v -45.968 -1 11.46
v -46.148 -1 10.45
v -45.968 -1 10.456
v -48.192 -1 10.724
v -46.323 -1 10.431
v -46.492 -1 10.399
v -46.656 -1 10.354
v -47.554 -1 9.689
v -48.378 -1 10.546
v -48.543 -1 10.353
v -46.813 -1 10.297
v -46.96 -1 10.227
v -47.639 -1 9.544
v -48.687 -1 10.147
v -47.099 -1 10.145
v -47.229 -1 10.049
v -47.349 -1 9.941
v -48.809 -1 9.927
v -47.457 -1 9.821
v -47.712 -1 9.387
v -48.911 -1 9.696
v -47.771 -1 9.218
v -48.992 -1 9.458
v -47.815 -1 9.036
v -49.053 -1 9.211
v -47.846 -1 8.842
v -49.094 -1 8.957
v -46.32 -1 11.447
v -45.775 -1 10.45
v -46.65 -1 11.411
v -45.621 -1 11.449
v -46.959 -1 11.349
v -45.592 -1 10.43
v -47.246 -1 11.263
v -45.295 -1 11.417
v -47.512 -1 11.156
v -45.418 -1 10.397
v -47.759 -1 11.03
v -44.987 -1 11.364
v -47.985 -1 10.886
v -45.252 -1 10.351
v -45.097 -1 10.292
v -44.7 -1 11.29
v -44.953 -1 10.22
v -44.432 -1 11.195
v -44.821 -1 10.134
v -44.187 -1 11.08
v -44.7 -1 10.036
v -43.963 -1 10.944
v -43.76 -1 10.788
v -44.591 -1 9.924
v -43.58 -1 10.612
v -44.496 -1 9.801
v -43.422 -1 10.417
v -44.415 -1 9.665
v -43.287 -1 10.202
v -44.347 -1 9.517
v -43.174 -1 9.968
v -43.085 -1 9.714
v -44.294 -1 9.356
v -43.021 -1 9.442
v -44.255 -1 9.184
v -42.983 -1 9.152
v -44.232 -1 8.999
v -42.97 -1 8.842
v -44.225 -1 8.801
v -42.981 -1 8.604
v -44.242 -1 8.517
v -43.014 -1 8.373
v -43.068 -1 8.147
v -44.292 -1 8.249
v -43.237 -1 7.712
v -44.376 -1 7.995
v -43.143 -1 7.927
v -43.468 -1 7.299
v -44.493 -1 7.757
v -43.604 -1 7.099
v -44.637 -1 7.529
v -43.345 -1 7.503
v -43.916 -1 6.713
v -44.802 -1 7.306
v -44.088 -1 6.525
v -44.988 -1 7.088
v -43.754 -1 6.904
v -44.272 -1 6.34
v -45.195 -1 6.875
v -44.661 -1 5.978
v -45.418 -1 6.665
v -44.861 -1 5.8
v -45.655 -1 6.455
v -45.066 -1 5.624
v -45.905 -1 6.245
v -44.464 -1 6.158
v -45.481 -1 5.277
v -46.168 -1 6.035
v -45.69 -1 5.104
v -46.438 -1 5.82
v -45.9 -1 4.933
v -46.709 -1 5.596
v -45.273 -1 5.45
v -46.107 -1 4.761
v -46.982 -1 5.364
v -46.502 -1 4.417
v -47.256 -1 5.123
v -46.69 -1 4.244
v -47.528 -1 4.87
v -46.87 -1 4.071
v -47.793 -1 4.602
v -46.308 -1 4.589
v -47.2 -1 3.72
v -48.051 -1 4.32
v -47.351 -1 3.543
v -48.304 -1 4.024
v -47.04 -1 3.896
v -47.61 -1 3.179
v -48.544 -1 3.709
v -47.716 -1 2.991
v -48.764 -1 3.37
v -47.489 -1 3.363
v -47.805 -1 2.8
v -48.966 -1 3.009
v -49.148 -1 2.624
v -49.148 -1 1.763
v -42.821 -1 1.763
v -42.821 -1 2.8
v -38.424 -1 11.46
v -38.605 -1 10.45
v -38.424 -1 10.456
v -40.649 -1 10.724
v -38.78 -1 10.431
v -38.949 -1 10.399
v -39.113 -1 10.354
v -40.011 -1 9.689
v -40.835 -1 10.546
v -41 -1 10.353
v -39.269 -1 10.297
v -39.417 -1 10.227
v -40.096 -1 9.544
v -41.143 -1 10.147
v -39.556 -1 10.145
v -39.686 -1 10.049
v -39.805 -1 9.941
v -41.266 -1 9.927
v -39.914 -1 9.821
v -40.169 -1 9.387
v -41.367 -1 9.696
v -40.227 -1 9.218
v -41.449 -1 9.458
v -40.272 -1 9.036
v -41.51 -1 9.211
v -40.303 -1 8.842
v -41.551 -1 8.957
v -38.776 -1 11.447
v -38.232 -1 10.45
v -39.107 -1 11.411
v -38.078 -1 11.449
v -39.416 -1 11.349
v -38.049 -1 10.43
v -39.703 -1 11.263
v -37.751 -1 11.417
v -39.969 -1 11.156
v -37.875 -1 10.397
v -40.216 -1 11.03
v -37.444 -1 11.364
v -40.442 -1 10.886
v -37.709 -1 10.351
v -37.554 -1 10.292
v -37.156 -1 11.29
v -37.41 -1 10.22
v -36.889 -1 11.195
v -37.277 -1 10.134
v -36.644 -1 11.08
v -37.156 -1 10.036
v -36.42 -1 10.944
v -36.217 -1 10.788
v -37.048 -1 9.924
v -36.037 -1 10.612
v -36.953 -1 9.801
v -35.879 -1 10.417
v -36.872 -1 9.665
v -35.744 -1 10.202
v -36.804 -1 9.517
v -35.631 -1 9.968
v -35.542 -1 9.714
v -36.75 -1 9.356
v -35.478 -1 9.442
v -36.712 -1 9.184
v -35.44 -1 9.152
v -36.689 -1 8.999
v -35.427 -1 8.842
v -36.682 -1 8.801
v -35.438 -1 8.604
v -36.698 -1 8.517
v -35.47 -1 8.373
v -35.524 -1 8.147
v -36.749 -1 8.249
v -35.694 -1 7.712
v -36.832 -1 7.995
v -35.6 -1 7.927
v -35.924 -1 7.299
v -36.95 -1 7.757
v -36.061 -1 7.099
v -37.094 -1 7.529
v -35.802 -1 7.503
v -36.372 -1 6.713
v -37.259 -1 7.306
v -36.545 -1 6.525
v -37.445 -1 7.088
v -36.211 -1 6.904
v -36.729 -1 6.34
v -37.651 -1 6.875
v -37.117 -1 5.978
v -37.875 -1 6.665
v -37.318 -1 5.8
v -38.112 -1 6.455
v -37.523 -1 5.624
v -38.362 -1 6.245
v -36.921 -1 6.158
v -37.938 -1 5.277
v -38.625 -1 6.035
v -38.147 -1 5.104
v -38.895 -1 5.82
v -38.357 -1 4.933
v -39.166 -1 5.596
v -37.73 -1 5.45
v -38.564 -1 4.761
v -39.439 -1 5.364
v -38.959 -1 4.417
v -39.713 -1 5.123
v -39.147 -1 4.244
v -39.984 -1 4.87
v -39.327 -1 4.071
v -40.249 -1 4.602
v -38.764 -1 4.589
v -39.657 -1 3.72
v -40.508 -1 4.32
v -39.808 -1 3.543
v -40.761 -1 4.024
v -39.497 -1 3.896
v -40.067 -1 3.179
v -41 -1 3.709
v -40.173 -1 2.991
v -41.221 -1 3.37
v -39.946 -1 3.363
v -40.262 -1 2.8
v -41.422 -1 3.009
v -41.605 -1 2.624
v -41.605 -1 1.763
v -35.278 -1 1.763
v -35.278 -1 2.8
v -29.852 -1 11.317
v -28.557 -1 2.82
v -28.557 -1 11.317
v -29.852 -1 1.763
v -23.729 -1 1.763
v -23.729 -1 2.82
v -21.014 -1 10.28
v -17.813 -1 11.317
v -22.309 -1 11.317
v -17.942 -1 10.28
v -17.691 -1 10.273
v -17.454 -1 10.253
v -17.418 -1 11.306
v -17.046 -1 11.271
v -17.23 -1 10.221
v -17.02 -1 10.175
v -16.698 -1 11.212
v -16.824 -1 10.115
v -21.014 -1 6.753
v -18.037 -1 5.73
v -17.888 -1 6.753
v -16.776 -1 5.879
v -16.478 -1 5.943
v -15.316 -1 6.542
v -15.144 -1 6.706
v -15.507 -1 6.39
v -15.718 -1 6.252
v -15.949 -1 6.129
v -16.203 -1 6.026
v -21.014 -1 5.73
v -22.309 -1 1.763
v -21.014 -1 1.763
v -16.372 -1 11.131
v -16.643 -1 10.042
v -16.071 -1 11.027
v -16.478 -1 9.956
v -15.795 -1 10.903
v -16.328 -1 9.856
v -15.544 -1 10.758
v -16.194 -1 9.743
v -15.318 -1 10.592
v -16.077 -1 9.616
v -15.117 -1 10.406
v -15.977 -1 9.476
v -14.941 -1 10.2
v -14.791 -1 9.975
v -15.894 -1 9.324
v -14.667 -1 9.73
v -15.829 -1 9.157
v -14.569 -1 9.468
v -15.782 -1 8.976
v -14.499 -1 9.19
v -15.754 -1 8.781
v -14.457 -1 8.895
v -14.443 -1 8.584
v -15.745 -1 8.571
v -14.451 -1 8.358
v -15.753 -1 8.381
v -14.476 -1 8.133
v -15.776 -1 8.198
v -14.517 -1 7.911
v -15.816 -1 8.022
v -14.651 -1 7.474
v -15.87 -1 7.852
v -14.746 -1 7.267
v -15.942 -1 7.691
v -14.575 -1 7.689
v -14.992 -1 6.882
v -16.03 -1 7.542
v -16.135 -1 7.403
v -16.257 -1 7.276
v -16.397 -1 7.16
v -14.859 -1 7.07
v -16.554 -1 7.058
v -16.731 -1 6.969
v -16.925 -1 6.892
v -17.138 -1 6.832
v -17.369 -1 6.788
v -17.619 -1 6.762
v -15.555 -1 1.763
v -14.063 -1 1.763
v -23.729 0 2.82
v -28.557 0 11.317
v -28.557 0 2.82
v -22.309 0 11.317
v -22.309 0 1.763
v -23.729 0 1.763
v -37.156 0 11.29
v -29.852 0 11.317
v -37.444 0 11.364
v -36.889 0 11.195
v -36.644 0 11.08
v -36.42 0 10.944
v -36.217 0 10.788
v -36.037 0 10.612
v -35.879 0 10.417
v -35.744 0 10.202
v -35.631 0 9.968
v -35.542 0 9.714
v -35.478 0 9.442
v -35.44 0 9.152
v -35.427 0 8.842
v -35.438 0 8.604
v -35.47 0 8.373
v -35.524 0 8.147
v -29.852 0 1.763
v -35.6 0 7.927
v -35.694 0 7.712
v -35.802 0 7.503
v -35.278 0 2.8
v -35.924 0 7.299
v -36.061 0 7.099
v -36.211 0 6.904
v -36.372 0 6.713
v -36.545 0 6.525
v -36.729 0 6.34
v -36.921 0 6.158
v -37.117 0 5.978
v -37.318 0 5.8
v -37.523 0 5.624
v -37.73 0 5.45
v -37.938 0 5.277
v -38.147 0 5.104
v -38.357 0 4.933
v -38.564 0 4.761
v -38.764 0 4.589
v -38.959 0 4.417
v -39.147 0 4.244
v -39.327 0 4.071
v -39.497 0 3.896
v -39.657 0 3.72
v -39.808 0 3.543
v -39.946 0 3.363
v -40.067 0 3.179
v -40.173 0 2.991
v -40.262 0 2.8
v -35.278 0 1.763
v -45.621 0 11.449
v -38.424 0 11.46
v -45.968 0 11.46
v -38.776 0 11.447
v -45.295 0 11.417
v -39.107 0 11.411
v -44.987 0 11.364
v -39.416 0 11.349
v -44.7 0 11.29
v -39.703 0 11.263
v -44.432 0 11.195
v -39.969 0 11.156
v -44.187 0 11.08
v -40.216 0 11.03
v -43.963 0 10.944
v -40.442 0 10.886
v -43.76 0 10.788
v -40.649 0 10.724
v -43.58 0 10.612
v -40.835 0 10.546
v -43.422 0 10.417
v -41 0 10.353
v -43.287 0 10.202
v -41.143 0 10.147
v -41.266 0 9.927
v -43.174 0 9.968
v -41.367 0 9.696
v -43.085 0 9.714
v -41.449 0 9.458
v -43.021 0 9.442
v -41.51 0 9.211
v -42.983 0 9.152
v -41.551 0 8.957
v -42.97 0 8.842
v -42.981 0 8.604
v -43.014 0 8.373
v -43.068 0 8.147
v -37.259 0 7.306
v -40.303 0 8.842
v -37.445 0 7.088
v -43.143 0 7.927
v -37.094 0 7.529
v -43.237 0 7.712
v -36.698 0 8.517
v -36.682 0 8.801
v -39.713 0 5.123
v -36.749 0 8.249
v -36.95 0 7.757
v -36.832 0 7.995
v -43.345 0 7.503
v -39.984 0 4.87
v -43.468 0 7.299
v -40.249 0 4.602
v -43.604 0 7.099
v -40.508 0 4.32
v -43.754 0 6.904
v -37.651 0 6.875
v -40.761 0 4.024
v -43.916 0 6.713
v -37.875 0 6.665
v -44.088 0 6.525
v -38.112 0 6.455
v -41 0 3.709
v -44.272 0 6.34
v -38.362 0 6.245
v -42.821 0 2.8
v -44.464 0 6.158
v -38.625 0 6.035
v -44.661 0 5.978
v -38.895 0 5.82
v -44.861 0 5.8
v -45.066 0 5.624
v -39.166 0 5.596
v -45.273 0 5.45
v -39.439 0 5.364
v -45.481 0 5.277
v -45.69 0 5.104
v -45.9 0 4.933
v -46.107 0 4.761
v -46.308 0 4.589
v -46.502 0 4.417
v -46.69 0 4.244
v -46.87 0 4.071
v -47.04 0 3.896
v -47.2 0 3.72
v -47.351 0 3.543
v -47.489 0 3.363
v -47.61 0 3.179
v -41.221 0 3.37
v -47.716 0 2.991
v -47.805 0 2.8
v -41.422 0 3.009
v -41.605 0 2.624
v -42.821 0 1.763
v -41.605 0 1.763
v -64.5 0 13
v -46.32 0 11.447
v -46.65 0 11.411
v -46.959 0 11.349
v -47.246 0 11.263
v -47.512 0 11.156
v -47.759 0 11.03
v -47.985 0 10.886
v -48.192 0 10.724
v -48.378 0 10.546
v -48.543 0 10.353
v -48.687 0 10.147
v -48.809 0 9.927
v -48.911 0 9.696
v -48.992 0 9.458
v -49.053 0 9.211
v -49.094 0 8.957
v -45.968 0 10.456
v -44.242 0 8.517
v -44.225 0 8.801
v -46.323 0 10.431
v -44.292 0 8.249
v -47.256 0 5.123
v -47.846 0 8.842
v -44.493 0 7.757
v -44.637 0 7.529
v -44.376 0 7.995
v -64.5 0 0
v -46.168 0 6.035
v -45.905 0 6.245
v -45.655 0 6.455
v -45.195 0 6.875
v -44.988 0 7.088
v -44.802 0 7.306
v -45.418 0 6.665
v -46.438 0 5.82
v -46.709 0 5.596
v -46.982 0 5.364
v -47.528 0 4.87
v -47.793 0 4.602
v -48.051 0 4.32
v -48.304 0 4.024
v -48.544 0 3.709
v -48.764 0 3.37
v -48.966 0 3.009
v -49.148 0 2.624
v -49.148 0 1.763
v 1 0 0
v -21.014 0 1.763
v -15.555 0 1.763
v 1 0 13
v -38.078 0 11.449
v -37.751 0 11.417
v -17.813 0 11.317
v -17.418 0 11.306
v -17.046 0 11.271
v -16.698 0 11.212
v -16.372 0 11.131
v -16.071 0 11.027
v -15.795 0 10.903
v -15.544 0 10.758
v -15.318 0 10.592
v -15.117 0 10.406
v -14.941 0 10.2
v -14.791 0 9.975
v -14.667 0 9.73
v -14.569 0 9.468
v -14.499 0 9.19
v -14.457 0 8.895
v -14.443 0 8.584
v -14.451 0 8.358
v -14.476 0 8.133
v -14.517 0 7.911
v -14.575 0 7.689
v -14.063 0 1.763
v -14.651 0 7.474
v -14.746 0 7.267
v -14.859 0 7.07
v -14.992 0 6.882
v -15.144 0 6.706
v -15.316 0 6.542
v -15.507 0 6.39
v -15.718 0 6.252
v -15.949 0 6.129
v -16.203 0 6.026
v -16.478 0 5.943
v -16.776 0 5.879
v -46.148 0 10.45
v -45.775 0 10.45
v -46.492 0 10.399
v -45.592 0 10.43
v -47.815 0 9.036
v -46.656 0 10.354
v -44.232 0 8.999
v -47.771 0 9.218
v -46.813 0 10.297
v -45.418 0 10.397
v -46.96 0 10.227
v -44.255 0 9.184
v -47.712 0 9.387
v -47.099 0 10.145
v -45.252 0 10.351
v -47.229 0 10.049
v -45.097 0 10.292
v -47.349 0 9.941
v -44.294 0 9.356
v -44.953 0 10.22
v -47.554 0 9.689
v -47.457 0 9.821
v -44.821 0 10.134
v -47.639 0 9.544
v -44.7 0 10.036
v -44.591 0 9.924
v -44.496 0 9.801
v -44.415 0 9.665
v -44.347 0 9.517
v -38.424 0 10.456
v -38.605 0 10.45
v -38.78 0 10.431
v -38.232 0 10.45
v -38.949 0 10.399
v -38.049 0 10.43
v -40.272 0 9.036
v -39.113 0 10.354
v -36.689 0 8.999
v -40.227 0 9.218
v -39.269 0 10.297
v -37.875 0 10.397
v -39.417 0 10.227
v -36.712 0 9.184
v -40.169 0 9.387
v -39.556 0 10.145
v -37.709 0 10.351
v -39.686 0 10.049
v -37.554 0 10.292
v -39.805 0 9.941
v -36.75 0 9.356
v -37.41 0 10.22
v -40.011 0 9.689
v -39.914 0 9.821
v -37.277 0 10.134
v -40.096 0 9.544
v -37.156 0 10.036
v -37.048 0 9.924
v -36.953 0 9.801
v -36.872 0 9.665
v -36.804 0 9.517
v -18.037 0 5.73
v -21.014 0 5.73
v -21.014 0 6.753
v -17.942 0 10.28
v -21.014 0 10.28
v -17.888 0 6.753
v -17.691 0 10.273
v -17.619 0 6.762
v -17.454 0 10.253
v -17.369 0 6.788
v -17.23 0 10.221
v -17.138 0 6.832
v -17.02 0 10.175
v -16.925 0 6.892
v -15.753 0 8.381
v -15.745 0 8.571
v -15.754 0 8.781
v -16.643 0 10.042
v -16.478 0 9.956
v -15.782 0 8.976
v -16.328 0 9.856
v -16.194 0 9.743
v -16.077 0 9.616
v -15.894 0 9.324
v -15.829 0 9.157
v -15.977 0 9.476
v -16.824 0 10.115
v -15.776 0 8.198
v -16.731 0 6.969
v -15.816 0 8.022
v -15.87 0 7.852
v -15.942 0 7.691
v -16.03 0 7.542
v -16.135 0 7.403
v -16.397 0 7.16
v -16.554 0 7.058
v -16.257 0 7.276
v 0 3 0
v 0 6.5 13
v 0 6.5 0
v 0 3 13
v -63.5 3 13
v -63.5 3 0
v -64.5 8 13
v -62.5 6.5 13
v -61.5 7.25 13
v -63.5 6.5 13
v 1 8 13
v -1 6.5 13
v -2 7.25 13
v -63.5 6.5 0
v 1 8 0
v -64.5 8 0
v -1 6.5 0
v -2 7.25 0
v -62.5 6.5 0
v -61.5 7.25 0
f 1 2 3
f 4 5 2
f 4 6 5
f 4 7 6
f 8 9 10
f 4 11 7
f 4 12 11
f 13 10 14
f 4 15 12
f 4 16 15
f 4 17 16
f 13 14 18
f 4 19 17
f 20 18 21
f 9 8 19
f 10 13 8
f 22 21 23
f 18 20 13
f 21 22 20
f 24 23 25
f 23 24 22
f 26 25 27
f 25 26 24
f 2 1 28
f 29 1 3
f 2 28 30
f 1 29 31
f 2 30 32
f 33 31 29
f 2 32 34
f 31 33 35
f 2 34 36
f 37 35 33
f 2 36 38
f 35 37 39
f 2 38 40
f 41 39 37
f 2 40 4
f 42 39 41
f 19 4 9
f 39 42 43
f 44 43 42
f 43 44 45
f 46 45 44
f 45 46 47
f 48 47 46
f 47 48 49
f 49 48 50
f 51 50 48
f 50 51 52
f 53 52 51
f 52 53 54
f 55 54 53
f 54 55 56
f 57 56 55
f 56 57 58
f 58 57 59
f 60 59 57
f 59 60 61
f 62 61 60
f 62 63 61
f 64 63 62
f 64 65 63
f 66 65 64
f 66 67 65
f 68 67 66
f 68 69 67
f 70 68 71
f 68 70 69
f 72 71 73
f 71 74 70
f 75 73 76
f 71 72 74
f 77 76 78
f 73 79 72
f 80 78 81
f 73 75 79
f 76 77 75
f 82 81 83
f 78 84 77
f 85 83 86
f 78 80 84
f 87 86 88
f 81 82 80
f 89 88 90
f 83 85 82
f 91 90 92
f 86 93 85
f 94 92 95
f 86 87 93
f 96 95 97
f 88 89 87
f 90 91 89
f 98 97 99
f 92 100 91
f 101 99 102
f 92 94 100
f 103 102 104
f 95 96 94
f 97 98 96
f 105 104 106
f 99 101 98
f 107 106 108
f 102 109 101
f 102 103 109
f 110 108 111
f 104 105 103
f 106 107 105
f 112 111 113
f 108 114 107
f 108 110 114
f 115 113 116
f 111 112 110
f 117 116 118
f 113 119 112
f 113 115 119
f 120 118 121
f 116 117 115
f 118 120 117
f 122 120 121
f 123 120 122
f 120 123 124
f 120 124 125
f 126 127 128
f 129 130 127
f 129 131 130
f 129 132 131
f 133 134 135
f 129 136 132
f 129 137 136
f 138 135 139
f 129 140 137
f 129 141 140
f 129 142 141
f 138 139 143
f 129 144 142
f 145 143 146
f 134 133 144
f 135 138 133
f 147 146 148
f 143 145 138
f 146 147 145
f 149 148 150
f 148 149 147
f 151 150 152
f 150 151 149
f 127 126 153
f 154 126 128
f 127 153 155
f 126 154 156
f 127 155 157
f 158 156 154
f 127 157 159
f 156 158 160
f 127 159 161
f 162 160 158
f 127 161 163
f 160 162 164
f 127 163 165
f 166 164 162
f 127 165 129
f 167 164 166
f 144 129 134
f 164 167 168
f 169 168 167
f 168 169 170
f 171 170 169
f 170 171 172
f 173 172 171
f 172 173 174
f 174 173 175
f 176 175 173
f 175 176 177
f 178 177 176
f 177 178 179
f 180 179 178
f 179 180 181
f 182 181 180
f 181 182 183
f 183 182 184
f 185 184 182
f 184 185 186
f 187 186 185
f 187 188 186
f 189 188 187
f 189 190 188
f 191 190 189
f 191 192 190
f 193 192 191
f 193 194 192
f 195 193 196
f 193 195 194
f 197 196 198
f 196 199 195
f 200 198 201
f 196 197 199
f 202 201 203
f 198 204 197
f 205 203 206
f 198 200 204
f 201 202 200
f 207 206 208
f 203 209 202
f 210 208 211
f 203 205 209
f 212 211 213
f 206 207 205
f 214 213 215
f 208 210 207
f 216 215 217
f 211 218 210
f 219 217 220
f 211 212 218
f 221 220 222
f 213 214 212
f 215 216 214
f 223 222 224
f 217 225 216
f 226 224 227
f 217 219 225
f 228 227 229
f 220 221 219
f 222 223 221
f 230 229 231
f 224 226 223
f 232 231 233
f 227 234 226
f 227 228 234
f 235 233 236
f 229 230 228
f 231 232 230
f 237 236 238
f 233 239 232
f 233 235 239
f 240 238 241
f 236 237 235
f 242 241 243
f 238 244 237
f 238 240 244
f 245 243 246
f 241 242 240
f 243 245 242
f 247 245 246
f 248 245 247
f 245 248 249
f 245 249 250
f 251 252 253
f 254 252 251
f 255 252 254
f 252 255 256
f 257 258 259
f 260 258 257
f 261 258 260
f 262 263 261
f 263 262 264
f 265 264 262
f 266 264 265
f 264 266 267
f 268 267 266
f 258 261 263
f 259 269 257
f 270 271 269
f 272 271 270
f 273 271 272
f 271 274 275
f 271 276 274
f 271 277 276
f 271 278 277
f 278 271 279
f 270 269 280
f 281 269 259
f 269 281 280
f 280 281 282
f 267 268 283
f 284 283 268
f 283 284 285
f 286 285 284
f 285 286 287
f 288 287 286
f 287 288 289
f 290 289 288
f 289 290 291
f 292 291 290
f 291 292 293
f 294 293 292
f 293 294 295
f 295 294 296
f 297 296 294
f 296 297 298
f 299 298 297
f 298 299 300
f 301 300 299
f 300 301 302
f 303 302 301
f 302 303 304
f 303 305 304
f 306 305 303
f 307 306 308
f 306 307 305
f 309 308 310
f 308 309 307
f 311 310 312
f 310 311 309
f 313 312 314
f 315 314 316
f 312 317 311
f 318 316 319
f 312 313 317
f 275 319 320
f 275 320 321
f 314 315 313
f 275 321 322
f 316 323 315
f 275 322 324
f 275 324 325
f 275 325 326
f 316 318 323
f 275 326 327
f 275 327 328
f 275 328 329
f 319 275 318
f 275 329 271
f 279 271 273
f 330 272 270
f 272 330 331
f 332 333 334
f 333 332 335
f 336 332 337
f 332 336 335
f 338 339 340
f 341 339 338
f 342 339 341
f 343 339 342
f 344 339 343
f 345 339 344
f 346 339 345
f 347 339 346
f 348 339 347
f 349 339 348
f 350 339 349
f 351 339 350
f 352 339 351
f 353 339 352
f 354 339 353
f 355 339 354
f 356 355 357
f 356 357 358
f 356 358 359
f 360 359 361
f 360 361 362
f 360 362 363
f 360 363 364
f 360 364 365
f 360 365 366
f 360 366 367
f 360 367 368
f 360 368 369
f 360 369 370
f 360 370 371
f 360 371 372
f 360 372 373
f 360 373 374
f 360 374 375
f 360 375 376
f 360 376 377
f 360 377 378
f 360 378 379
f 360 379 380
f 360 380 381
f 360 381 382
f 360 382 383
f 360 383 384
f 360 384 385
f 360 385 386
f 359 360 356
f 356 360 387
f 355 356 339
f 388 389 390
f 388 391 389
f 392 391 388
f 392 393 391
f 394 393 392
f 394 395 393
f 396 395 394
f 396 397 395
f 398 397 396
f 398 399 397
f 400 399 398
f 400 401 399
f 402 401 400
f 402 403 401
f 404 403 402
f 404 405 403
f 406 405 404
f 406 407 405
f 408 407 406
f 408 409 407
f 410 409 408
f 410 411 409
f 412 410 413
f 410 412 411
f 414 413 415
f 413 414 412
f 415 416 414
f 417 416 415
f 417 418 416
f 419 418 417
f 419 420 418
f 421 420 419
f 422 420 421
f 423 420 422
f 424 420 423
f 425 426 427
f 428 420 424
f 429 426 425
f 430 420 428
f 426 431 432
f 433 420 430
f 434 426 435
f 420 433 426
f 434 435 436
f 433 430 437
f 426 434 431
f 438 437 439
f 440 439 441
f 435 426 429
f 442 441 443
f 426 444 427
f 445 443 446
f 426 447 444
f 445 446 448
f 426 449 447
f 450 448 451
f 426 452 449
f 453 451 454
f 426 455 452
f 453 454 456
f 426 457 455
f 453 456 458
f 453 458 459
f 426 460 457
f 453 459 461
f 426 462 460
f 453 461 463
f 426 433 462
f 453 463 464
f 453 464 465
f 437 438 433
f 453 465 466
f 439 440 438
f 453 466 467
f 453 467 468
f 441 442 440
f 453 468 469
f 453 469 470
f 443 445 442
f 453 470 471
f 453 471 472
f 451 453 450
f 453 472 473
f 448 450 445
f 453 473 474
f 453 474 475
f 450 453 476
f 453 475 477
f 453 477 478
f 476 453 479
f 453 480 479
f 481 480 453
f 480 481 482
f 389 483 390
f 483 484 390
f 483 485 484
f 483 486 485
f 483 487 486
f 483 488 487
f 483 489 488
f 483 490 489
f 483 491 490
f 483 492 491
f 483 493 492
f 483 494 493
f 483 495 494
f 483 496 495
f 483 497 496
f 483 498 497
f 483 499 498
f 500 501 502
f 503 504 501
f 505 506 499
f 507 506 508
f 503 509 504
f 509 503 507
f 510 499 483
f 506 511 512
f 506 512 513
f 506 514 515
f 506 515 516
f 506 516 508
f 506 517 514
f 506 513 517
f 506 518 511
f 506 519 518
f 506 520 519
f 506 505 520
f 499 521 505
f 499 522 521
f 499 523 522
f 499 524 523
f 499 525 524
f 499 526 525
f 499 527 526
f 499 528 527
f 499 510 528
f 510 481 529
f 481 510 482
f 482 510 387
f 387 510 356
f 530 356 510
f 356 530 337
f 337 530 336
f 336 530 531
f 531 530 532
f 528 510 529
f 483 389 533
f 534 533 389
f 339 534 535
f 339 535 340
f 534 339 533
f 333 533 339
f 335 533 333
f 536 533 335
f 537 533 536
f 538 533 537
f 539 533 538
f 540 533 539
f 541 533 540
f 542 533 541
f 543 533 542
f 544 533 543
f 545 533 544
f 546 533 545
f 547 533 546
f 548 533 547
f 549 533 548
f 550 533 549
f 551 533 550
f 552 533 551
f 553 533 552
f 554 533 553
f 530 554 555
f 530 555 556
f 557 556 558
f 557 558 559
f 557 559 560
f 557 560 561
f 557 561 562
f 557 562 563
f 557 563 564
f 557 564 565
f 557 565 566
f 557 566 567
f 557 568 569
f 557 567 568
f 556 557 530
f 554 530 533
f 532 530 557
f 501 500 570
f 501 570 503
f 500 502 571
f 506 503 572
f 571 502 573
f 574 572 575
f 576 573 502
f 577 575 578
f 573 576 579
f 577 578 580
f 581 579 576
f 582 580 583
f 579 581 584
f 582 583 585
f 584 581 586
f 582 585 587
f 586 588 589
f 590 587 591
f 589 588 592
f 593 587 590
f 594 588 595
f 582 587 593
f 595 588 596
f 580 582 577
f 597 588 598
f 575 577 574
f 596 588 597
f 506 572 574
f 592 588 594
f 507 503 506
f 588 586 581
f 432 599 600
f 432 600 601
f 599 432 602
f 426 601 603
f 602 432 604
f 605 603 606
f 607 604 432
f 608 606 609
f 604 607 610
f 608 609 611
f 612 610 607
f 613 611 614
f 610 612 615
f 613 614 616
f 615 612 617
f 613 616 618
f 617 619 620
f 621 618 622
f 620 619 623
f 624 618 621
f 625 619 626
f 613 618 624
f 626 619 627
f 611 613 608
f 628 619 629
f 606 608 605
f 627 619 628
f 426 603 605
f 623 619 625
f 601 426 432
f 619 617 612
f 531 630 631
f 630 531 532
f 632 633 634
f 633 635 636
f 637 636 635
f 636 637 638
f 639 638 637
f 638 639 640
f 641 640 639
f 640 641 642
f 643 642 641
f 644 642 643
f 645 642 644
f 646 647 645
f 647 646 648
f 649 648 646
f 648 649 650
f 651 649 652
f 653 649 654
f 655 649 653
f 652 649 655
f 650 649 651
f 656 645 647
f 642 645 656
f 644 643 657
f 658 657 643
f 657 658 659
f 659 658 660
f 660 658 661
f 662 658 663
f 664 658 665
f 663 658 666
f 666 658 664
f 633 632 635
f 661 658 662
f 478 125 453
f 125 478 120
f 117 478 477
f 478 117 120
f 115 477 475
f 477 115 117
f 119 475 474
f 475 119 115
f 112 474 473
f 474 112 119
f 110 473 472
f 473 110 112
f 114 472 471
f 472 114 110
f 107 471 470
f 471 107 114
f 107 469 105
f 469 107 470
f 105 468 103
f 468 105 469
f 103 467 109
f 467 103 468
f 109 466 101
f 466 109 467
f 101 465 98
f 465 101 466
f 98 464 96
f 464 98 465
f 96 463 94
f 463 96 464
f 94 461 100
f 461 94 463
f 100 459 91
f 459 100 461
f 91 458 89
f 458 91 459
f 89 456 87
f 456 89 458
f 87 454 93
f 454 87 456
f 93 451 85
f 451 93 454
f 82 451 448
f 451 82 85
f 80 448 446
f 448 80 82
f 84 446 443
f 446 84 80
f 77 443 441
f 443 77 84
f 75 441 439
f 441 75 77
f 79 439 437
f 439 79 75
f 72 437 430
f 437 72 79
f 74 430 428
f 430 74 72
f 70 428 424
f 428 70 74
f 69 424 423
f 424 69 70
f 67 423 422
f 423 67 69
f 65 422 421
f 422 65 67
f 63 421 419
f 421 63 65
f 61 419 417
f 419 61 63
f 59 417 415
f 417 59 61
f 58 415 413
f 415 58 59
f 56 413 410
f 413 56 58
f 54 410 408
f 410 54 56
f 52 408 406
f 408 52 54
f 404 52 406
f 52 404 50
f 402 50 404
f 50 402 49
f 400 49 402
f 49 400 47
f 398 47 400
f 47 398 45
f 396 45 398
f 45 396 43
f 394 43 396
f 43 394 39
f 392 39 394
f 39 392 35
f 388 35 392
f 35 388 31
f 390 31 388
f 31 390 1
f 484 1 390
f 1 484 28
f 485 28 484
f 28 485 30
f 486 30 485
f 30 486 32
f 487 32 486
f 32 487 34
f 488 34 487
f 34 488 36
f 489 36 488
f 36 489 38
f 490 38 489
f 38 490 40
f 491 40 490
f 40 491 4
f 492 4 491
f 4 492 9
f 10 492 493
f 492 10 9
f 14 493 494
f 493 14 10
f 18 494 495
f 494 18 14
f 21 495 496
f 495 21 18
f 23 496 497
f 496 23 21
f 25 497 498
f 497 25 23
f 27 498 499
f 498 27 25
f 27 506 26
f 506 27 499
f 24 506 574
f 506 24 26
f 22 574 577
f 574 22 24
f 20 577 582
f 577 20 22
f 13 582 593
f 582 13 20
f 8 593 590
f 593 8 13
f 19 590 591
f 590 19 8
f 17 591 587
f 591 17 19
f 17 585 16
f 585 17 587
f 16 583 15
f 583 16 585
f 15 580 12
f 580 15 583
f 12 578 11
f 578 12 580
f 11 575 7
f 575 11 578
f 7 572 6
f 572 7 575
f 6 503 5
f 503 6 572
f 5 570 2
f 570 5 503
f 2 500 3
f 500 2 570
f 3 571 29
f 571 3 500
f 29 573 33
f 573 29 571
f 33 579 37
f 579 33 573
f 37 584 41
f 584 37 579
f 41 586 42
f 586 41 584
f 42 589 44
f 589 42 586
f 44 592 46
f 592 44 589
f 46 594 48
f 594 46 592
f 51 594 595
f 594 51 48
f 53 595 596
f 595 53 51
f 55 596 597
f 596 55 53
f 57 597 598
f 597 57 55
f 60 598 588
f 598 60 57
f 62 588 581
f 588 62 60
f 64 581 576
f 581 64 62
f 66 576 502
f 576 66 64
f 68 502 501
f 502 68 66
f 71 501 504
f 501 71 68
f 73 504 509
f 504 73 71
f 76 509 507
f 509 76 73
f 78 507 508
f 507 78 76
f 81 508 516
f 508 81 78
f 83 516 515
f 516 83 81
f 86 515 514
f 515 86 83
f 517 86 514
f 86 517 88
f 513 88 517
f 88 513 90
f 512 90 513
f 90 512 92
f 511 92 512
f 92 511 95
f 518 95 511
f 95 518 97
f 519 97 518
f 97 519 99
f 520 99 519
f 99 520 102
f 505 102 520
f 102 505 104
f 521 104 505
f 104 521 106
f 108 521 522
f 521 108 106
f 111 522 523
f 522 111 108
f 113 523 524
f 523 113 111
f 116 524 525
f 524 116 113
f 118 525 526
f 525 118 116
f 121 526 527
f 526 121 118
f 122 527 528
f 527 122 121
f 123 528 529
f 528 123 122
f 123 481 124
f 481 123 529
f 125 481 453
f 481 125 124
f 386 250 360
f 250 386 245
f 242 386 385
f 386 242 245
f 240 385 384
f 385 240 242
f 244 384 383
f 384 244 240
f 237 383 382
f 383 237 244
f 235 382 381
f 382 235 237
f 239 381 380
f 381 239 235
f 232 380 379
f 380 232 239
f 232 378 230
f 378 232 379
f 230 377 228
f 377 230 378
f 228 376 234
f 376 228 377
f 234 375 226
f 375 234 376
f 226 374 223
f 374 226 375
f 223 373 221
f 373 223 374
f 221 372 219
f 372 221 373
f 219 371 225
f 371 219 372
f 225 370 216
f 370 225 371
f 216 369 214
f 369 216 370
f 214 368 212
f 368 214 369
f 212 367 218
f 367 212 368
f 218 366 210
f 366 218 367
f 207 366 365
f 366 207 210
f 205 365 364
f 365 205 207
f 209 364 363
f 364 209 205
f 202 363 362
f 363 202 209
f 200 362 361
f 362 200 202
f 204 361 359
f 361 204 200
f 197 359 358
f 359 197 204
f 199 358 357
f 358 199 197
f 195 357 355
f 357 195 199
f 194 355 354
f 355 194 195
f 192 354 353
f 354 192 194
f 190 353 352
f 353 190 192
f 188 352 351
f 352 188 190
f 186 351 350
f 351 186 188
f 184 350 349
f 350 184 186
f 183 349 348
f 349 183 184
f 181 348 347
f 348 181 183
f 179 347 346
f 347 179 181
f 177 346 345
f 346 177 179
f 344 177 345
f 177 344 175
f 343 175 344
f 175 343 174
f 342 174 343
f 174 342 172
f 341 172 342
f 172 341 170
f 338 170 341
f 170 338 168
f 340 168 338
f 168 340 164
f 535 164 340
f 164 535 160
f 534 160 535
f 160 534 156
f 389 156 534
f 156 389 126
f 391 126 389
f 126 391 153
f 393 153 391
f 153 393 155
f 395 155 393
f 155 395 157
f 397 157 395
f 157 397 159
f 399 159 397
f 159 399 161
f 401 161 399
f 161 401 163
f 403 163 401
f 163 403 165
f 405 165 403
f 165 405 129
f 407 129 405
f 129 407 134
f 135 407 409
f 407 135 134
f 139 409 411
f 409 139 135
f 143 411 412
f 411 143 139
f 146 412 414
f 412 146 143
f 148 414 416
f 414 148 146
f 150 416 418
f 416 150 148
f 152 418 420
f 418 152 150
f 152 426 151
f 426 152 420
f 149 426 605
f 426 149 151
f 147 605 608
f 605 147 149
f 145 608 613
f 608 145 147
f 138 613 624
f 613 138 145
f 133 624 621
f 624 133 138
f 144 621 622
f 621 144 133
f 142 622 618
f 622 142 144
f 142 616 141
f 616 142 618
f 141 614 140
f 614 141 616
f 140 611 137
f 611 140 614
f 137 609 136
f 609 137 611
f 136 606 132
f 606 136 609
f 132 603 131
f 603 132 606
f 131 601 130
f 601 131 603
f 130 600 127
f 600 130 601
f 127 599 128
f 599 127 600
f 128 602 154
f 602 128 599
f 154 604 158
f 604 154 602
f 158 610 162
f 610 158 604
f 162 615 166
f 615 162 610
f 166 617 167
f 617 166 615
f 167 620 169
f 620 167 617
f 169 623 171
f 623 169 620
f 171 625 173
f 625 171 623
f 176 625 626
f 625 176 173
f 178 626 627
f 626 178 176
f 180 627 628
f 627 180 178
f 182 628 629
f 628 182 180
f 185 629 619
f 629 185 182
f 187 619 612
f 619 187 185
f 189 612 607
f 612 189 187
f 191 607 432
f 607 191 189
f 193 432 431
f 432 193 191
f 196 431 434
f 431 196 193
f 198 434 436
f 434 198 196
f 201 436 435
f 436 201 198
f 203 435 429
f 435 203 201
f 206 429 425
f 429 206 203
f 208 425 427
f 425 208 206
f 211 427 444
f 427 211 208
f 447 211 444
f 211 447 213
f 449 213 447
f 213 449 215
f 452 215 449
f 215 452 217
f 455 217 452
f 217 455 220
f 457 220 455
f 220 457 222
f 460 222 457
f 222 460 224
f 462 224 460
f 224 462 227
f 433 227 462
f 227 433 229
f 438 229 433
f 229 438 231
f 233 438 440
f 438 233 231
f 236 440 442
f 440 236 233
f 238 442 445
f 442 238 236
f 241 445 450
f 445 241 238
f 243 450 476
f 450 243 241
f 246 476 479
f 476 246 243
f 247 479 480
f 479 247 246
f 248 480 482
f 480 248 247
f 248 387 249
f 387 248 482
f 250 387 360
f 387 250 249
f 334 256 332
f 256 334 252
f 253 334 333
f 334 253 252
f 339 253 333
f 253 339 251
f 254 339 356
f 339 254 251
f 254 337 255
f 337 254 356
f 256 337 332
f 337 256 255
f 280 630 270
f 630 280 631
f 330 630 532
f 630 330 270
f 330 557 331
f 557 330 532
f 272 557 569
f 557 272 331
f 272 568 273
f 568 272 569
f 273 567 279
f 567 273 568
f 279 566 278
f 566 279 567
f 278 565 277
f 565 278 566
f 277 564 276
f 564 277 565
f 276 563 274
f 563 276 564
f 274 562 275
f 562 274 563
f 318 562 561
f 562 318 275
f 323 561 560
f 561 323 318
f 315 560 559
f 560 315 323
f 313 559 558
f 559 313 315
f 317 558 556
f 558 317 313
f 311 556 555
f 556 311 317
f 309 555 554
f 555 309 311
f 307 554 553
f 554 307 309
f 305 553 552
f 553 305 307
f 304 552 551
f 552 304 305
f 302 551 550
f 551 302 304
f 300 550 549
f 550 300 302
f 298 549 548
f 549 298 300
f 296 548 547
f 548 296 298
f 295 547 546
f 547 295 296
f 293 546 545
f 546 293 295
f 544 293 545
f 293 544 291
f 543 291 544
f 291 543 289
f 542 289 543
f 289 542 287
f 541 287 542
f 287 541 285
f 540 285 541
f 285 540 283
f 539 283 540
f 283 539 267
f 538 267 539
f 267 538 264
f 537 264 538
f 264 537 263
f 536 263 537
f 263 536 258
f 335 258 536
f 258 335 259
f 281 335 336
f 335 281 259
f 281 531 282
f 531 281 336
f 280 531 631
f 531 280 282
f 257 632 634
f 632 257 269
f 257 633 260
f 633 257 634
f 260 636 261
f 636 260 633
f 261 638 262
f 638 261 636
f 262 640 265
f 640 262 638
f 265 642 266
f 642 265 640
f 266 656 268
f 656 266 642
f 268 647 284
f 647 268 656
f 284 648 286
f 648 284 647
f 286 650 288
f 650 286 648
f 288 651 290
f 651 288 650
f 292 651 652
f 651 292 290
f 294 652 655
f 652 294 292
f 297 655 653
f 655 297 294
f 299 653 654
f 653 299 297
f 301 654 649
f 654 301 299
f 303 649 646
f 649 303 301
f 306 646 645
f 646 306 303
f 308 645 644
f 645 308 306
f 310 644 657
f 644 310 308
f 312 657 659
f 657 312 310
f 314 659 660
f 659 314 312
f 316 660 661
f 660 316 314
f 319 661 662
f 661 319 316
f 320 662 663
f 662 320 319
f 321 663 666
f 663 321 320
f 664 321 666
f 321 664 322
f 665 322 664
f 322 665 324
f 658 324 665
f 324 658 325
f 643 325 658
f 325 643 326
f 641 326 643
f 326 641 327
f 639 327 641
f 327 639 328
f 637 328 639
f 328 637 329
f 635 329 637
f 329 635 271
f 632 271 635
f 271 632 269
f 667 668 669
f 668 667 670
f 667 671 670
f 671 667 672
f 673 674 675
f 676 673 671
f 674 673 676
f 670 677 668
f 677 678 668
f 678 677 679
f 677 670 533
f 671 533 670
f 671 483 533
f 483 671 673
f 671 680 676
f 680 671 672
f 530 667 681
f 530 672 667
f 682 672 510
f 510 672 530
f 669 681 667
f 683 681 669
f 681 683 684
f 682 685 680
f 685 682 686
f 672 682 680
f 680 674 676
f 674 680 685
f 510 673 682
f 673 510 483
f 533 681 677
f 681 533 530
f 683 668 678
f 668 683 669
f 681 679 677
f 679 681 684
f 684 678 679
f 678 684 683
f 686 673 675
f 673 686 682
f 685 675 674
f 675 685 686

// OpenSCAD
cantag();
//BEGIN VARIABLES
TAG_TEXT="22 LR";
TEXT_HEIGHT=1;
TEXT_FONT_SIZE=10;
TEXT_FONT="Liberation Sans";
TAG_OUTSIDE_THICKNESS=3;
TAG_OUTSIDE_WIDTH=63.5;
TAG_OUTSIDE_HEIGHT=13;
INWARD_ARM_THICKNESS=1;
INWARD_ARM_DEPTH=3.5;
BACKSIDE_TAB_THINCKNESS=1.5;
BACKSIDE_TAB_DEPTH=2;
BACKSIDE_TAB_GRIP_DEPTH=1;

module cantag(){
rotate([90,0,180]){
//Text
    union(){
        

    translate([TAG_OUTSIDE_WIDTH/2,TAG_OUTSIDE_HEIGHT/2,-TEXT_HEIGHT]){
    mirror([1,0,0])    
    color("blue")
        linear_extrude(height=TEXT_HEIGHT, center=false)
    text(str(TAG_TEXT),size = TEXT_FONT_SIZE, font = TEXT_FONT, valign="center", halign="center");
    }
    
//Base Tag
color("red")
linear_extrude(height=TAG_OUTSIDE_THICKNESS, center=false)
square([TAG_OUTSIDE_WIDTH,TAG_OUTSIDE_HEIGHT]);

//ARM 1
color("lime", 1.0 )
linear_extrude(height=INWARD_ARM_DEPTH+TAG_OUTSIDE_THICKNESS, center=false)
translate([TAG_OUTSIDE_WIDTH,0,0])
square([INWARD_ARM_THICKNESS,TAG_OUTSIDE_HEIGHT]);

//ARM2
color("lime", 1.0 )
linear_extrude(height=INWARD_ARM_DEPTH+TAG_OUTSIDE_THICKNESS, center=false)
translate([-INWARD_ARM_THICKNESS,0,0])
color("lime", 1.0 )
square([INWARD_ARM_THICKNESS,TAG_OUTSIDE_HEIGHT]);

//Backside Tab 1
color("yellow")
translate([-INWARD_ARM_THICKNESS,0,INWARD_ARM_DEPTH+TAG_OUTSIDE_THICKNESS+BACKSIDE_TAB_THINCKNESS])
rotate([-90,0,0])
linear_extrude(height=TAG_OUTSIDE_HEIGHT,center=false)
polygon(points=[[0,0],[0,BACKSIDE_TAB_THINCKNESS],[INWARD_ARM_THICKNESS+BACKSIDE_TAB_GRIP_DEPTH,BACKSIDE_TAB_THINCKNESS],[BACKSIDE_TAB_DEPTH+INWARD_ARM_THICKNESS,BACKSIDE_TAB_THINCKNESS * 0.5]]);

//Backside Tab 2
color("yellow")
translate([TAG_OUTSIDE_WIDTH+INWARD_ARM_THICKNESS,TAG_OUTSIDE_HEIGHT,INWARD_ARM_DEPTH+TAG_OUTSIDE_THICKNESS+BACKSIDE_TAB_THINCKNESS])
rotate([-90,0,180])
mirror([0,0,0])
linear_extrude(height=TAG_OUTSIDE_HEIGHT,center=false)
polygon(points=[[0,0],[0,BACKSIDE_TAB_THINCKNESS],[INWARD_ARM_THICKNESS+BACKSIDE_TAB_GRIP_DEPTH,BACKSIDE_TAB_THINCKNESS],[BACKSIDE_TAB_DEPTH+INWARD_ARM_THICKNESS,BACKSIDE_TAB_THINCKNESS * 0.5]]);
}}
}
